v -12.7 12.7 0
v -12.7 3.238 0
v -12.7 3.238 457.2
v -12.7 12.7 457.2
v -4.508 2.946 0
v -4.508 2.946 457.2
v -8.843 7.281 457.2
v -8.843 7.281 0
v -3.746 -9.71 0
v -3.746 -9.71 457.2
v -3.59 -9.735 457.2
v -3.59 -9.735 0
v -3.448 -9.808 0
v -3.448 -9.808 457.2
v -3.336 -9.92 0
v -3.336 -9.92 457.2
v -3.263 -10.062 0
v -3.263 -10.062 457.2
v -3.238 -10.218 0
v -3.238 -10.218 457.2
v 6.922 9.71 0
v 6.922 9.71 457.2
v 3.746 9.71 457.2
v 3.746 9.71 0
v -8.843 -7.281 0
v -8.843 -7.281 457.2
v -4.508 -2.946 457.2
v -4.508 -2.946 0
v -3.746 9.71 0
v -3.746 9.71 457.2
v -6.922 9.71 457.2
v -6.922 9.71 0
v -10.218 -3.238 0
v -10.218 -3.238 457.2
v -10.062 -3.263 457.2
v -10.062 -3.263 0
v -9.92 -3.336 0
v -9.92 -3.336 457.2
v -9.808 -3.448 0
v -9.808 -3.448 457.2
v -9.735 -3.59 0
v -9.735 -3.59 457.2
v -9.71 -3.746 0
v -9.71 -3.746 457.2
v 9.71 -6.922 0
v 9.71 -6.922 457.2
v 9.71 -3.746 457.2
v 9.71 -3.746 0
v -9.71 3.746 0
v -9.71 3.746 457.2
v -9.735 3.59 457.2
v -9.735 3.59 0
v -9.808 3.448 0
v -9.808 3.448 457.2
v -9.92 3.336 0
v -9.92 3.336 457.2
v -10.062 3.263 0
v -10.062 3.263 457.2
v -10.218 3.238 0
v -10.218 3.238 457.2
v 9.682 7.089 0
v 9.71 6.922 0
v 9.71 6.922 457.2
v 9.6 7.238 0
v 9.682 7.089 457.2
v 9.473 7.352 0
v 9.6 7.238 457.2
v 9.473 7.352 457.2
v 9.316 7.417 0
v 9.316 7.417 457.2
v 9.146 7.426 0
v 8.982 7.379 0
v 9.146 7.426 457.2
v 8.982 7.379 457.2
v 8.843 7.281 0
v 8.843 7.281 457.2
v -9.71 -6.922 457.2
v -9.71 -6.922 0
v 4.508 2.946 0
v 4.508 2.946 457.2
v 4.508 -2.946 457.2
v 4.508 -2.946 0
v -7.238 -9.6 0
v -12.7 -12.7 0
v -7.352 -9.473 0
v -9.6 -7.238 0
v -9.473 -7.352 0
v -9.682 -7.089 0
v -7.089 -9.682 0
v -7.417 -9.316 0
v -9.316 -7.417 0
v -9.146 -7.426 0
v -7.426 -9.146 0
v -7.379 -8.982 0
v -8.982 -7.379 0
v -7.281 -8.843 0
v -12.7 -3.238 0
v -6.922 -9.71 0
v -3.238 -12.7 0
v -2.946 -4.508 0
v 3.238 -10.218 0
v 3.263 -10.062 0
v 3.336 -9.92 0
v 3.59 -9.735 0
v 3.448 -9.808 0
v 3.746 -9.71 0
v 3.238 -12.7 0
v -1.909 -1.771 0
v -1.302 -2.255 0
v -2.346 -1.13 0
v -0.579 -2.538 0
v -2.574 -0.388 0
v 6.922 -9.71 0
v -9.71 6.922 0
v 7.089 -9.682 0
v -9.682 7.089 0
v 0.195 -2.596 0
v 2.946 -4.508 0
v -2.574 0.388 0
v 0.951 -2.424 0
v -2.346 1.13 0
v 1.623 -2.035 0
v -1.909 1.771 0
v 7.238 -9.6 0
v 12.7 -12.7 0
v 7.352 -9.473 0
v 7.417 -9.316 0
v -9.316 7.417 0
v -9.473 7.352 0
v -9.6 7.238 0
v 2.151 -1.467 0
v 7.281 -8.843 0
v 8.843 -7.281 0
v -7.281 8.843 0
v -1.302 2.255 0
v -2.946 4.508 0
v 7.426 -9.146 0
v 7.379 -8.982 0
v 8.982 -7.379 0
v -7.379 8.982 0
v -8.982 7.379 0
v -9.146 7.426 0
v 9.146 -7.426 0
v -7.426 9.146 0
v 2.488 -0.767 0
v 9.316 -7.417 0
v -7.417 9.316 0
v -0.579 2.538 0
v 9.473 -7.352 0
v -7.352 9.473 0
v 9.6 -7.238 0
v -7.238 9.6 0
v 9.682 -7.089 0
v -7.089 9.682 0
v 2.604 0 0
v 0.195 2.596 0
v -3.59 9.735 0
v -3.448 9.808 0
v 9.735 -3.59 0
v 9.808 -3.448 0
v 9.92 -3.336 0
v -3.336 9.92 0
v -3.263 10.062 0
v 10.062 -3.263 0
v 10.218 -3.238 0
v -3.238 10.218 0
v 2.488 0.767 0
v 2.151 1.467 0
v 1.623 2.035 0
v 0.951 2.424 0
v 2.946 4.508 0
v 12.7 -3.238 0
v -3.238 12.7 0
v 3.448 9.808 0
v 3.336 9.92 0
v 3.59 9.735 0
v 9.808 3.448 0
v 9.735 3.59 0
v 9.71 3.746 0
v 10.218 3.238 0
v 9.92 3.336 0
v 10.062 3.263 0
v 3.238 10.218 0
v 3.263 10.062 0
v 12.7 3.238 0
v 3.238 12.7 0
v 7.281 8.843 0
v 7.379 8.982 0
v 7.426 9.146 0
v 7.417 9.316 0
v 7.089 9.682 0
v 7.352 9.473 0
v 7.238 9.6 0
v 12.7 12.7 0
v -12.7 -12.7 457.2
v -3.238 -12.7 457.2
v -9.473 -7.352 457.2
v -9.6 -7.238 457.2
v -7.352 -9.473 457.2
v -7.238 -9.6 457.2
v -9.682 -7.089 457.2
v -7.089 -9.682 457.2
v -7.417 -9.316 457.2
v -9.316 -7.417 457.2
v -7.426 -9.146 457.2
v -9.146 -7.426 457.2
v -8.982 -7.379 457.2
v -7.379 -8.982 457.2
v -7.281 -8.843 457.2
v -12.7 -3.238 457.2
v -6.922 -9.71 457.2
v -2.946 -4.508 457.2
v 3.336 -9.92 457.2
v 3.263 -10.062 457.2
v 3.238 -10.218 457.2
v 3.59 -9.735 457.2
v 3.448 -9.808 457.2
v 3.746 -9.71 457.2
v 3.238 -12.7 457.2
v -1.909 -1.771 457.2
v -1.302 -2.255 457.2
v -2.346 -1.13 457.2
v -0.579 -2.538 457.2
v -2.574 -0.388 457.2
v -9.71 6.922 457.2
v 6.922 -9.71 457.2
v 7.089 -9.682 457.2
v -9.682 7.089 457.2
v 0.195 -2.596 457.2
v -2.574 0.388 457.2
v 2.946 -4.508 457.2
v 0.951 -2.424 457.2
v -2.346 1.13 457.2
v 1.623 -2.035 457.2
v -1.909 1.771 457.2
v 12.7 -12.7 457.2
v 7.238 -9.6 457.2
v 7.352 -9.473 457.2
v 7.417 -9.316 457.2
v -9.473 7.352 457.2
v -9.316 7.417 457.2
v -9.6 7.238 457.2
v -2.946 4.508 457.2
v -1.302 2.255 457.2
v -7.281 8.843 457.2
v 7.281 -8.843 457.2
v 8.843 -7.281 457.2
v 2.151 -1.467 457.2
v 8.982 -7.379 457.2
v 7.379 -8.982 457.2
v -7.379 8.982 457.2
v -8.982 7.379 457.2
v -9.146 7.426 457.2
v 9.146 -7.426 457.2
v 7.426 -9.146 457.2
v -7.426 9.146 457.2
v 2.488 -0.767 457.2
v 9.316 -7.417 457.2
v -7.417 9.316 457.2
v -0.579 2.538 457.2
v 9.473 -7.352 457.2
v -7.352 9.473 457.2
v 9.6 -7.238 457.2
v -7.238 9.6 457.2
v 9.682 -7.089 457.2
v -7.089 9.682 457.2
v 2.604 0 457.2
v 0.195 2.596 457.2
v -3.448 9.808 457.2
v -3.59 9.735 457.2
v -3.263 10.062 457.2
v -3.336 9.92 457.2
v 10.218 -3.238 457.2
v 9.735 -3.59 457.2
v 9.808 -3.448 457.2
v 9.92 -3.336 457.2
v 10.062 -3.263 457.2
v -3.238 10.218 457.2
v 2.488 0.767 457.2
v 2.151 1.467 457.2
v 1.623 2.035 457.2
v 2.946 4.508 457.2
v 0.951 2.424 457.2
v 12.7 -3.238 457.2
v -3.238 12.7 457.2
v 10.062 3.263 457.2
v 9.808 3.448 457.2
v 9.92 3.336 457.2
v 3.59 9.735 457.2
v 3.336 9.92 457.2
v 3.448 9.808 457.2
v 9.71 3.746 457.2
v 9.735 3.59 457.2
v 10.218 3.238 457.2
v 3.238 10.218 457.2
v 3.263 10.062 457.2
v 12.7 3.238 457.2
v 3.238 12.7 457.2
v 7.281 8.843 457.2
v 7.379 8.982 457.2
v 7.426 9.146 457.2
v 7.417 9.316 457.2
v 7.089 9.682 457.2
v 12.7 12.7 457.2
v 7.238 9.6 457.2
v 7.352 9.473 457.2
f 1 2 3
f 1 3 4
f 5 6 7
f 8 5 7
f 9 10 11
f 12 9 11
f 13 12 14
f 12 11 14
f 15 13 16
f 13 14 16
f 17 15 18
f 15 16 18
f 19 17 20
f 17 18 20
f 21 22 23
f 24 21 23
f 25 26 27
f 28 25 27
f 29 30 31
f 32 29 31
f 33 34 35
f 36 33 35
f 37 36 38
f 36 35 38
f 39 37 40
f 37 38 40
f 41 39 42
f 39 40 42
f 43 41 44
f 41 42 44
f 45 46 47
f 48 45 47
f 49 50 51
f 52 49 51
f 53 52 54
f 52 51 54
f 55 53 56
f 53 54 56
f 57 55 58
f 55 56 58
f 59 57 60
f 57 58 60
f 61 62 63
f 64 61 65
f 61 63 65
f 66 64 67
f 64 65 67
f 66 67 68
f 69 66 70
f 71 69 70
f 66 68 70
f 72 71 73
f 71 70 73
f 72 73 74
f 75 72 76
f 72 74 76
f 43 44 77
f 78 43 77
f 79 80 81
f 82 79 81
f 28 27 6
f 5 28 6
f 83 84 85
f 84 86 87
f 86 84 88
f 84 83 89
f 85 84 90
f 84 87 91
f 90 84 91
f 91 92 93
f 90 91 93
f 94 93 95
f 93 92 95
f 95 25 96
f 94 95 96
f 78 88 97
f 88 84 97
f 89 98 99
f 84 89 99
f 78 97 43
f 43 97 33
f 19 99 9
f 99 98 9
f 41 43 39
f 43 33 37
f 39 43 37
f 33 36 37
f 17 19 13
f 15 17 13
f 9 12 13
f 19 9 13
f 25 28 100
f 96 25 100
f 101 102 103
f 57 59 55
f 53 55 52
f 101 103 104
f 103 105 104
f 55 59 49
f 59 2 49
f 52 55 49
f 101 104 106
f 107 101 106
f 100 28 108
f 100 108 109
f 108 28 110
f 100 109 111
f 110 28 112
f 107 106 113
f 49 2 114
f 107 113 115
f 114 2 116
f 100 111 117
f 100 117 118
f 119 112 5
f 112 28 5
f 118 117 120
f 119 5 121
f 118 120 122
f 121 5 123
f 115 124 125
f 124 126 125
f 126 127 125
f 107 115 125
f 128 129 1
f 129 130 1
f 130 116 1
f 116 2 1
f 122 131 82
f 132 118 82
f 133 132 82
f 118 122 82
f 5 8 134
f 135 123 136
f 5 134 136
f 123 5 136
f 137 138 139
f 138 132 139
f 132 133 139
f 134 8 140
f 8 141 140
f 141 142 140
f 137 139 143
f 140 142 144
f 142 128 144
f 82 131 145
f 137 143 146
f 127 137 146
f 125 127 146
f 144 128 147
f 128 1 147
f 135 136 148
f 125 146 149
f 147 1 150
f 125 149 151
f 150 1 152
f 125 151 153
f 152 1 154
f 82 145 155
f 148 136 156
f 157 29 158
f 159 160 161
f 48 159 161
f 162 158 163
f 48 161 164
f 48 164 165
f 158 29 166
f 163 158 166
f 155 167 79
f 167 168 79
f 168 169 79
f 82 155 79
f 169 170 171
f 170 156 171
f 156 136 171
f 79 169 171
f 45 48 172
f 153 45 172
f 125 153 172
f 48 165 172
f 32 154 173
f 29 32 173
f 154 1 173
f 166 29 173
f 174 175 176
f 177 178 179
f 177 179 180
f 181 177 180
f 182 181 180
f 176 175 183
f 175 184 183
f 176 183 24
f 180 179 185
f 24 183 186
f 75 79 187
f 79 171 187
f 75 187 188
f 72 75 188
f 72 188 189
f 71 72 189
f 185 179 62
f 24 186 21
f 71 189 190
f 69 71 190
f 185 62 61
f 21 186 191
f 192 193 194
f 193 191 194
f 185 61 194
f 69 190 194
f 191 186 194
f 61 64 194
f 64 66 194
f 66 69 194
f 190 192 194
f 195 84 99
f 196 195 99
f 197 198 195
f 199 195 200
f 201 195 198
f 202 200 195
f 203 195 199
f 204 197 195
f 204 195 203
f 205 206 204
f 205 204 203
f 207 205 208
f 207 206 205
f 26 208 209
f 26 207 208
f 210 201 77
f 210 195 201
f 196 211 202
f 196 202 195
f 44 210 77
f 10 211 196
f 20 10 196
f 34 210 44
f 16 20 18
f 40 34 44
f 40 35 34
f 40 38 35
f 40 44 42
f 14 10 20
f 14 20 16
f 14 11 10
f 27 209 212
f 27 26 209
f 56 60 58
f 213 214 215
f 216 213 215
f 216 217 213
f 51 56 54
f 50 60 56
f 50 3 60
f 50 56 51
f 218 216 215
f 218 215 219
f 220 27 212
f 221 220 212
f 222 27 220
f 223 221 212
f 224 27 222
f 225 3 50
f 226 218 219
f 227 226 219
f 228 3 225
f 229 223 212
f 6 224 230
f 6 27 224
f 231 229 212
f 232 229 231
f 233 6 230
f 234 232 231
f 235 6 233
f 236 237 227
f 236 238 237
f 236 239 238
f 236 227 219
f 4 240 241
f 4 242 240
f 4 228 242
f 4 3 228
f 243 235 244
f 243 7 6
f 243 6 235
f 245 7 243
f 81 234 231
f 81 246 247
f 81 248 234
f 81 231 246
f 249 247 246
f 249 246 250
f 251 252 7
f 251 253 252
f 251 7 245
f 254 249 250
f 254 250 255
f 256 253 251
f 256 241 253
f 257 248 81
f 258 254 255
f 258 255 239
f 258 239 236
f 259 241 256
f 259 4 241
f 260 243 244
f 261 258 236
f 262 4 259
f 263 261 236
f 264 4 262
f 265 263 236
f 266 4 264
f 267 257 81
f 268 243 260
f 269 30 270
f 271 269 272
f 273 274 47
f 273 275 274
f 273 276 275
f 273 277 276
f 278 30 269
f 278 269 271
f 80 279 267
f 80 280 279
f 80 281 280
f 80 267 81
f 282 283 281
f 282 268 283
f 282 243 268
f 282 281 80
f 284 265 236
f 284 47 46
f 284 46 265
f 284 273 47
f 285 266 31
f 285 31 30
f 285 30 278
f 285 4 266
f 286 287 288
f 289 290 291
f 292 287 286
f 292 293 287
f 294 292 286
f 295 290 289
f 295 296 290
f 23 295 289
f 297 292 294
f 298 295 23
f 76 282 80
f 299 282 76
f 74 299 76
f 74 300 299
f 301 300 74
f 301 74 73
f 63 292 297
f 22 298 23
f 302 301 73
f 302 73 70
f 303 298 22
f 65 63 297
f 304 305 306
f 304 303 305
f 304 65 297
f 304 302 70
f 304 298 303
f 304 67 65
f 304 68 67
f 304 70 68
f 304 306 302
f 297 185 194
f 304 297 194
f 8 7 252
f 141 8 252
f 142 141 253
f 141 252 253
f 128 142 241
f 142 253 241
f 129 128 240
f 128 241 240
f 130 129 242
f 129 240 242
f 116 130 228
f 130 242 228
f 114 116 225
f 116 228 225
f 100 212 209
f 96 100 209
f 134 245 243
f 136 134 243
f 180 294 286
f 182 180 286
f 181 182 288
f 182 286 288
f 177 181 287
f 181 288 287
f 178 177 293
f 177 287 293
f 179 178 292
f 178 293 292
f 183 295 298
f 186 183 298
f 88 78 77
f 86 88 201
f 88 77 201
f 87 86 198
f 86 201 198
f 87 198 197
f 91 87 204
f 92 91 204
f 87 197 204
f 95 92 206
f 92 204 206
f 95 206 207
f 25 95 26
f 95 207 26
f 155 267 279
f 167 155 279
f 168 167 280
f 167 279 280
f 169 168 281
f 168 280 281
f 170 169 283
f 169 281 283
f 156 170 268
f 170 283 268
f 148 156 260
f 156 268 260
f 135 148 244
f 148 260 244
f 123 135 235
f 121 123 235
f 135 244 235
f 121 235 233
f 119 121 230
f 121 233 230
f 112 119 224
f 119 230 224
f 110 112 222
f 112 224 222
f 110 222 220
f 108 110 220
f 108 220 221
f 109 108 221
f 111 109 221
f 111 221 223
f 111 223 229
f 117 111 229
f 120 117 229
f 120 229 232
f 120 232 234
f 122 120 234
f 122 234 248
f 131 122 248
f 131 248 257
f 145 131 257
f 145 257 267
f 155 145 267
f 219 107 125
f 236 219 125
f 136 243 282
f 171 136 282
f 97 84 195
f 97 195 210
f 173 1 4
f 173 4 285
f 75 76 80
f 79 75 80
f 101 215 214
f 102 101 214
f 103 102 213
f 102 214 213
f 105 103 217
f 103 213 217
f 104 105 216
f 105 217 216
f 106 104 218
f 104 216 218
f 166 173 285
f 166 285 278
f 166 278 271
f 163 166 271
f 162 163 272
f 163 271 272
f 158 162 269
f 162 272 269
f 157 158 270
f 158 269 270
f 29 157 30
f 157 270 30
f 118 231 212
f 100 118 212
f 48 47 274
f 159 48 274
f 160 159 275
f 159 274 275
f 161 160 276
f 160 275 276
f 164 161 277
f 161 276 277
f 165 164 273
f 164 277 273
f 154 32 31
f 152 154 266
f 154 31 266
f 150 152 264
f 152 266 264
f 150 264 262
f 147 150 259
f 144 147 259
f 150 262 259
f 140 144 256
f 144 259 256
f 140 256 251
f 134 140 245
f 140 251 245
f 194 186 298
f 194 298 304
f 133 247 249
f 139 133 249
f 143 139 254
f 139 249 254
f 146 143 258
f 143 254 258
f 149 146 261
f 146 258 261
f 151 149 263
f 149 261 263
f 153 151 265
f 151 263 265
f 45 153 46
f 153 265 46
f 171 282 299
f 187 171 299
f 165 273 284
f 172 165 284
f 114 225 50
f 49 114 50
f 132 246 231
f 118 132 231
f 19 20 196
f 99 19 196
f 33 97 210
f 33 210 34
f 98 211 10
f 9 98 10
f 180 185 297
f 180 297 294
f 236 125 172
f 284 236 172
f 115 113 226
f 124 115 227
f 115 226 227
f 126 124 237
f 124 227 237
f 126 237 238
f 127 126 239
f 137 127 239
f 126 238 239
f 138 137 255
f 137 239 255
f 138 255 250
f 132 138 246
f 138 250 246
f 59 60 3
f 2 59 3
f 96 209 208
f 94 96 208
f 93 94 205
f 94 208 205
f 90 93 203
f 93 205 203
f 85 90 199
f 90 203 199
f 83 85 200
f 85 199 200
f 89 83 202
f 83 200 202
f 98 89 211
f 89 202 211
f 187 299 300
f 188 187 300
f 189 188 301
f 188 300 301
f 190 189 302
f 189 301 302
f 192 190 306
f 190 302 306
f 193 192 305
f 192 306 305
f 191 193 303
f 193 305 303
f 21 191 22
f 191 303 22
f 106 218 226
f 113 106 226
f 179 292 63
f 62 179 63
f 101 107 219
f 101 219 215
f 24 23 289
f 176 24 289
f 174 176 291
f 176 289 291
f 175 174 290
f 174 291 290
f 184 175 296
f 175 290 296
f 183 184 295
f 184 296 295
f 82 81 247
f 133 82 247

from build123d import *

# Parameters (mm, degrees)
SKETCH2_W           = 25.4
SKETCH2_H           = 25.4
BOSS_EXTRUDE2_DEPTH = 457.2
SKETCH3_R           = 2.6035
CUT_EXTRUDE2_DEPTH  = 458.2


with BuildPart() as part:
    # Sketch2 → Boss-Extrude2 (new body)
    with BuildSketch(Plane.XY):
        Rectangle(SKETCH2_W, SKETCH2_H)
    extrude(amount=BOSS_EXTRUDE2_DEPTH)

    # Sketch3 → Cut-Extrude2 (cut, through all)
    with BuildSketch(Plane.XY.offset(457.2)):
        Circle(SKETCH3_R)
        with BuildLine():
            Line((-3.2385, 12.7), (-3.2385, 10.218485055))
            ThreePointArc((-3.2385, 10.218485055), (-3.387289755, 9.85927481), (-3.7465, 9.710485055))
            Line((-3.7465, 9.710485055), (-6.9215, 9.710485055))
            ThreePointArc((-6.9215, 9.710485055), (-7.390830803, 9.396888238), (-7.280710245, 8.84327481))
            Line((-7.280710245, 8.84327481), (-2.945935435, 4.5085))
            Line((-2.945935435, 4.5085), (2.945935435, 4.5085))
            Line((2.945935435, 4.5085), (7.280710245, 8.84327481))
            ThreePointArc((7.280710245, 8.84327481), (7.390830803, 9.396888238), (6.9215, 9.710485055))
            Line((6.9215, 9.710485055), (3.7465, 9.710485055))
            ThreePointArc((3.7465, 9.710485055), (3.387289755, 9.85927481), (3.2385, 10.218485055))
            Line((3.2385, 10.218485055), (3.2385, 12.7))
            Line((3.2385, 12.7), (-3.2385, 12.7))
        make_face()
        with BuildLine():
            Line((12.7, 3.2385), (10.218485055, 3.2385))
            ThreePointArc((10.218485055, 3.2385), (9.85927481, 3.387289755), (9.710485055, 3.7465))
            Line((9.710485055, 3.7465), (9.710485055, 6.9215))
            ThreePointArc((9.710485055, 6.9215), (9.396888238, 7.390830803), (8.84327481, 7.280710245))
            Line((8.84327481, 7.280710245), (4.5085, 2.945935435))
            Line((4.5085, 2.945935435), (4.5085, -2.945935435))
            Line((4.5085, -2.945935435), (8.84327481, -7.280710245))
            ThreePointArc((8.84327481, -7.280710245), (9.396888238, -7.390830803), (9.710485055, -6.9215))
            Line((9.710485055, -6.9215), (9.710485055, -3.7465))
            ThreePointArc((9.710485055, -3.7465), (9.85927481, -3.387289755), (10.218485055, -3.2385))
            Line((10.218485055, -3.2385), (12.7, -3.2385))
            Line((12.7, -3.2385), (12.7, 3.2385))
        make_face()
        with BuildLine():
            Line((3.2385, -12.7), (3.2385, -10.218485055))
            ThreePointArc((3.2385, -10.218485055), (3.387289755, -9.85927481), (3.7465, -9.710485055))
            Line((3.7465, -9.710485055), (6.9215, -9.710485055))
            ThreePointArc((6.9215, -9.710485055), (7.390830803, -9.396888238), (7.280710245, -8.84327481))
            Line((7.280710245, -8.84327481), (2.945935435, -4.5085))
            Line((2.945935435, -4.5085), (-2.945935435, -4.5085))
            Line((-2.945935435, -4.5085), (-7.280710245, -8.84327481))
            ThreePointArc((-7.280710245, -8.84327481), (-7.390830803, -9.396888238), (-6.9215, -9.710485055))
            Line((-6.9215, -9.710485055), (-3.7465, -9.710485055))
            ThreePointArc((-3.7465, -9.710485055), (-3.387289755, -9.85927481), (-3.2385, -10.218485055))
            Line((-3.2385, -10.218485055), (-3.2385, -12.7))
            Line((-3.2385, -12.7), (3.2385, -12.7))
        make_face()
        with BuildLine():
            Line((-12.7, -3.2385), (-10.218485055, -3.2385))
            ThreePointArc((-10.218485055, -3.2385), (-9.85927481, -3.387289755), (-9.710485055, -3.7465))
            Line((-9.710485055, -3.7465), (-9.710485055, -6.9215))
            ThreePointArc((-9.710485055, -6.9215), (-9.396888238, -7.390830803), (-8.84327481, -7.280710245))
            Line((-8.84327481, -7.280710245), (-4.5085, -2.945935435))
            Line((-4.5085, -2.945935435), (-4.5085, 2.945935435))
            Line((-4.5085, 2.945935435), (-8.84327481, 7.280710245))
            ThreePointArc((-8.84327481, 7.280710245), (-9.396888238, 7.390830803), (-9.710485055, 6.9215))
            Line((-9.710485055, 6.9215), (-9.710485055, 3.7465))
            ThreePointArc((-9.710485055, 3.7465), (-9.85927481, 3.387289755), (-10.218485055, 3.2385))
            Line((-10.218485055, 3.2385), (-12.7, 3.2385))
            Line((-12.7, 3.2385), (-12.7, -3.2385))
        make_face()
    extrude(amount=-CUT_EXTRUDE2_DEPTH, mode=Mode.SUBTRACT)


solid = part.part
